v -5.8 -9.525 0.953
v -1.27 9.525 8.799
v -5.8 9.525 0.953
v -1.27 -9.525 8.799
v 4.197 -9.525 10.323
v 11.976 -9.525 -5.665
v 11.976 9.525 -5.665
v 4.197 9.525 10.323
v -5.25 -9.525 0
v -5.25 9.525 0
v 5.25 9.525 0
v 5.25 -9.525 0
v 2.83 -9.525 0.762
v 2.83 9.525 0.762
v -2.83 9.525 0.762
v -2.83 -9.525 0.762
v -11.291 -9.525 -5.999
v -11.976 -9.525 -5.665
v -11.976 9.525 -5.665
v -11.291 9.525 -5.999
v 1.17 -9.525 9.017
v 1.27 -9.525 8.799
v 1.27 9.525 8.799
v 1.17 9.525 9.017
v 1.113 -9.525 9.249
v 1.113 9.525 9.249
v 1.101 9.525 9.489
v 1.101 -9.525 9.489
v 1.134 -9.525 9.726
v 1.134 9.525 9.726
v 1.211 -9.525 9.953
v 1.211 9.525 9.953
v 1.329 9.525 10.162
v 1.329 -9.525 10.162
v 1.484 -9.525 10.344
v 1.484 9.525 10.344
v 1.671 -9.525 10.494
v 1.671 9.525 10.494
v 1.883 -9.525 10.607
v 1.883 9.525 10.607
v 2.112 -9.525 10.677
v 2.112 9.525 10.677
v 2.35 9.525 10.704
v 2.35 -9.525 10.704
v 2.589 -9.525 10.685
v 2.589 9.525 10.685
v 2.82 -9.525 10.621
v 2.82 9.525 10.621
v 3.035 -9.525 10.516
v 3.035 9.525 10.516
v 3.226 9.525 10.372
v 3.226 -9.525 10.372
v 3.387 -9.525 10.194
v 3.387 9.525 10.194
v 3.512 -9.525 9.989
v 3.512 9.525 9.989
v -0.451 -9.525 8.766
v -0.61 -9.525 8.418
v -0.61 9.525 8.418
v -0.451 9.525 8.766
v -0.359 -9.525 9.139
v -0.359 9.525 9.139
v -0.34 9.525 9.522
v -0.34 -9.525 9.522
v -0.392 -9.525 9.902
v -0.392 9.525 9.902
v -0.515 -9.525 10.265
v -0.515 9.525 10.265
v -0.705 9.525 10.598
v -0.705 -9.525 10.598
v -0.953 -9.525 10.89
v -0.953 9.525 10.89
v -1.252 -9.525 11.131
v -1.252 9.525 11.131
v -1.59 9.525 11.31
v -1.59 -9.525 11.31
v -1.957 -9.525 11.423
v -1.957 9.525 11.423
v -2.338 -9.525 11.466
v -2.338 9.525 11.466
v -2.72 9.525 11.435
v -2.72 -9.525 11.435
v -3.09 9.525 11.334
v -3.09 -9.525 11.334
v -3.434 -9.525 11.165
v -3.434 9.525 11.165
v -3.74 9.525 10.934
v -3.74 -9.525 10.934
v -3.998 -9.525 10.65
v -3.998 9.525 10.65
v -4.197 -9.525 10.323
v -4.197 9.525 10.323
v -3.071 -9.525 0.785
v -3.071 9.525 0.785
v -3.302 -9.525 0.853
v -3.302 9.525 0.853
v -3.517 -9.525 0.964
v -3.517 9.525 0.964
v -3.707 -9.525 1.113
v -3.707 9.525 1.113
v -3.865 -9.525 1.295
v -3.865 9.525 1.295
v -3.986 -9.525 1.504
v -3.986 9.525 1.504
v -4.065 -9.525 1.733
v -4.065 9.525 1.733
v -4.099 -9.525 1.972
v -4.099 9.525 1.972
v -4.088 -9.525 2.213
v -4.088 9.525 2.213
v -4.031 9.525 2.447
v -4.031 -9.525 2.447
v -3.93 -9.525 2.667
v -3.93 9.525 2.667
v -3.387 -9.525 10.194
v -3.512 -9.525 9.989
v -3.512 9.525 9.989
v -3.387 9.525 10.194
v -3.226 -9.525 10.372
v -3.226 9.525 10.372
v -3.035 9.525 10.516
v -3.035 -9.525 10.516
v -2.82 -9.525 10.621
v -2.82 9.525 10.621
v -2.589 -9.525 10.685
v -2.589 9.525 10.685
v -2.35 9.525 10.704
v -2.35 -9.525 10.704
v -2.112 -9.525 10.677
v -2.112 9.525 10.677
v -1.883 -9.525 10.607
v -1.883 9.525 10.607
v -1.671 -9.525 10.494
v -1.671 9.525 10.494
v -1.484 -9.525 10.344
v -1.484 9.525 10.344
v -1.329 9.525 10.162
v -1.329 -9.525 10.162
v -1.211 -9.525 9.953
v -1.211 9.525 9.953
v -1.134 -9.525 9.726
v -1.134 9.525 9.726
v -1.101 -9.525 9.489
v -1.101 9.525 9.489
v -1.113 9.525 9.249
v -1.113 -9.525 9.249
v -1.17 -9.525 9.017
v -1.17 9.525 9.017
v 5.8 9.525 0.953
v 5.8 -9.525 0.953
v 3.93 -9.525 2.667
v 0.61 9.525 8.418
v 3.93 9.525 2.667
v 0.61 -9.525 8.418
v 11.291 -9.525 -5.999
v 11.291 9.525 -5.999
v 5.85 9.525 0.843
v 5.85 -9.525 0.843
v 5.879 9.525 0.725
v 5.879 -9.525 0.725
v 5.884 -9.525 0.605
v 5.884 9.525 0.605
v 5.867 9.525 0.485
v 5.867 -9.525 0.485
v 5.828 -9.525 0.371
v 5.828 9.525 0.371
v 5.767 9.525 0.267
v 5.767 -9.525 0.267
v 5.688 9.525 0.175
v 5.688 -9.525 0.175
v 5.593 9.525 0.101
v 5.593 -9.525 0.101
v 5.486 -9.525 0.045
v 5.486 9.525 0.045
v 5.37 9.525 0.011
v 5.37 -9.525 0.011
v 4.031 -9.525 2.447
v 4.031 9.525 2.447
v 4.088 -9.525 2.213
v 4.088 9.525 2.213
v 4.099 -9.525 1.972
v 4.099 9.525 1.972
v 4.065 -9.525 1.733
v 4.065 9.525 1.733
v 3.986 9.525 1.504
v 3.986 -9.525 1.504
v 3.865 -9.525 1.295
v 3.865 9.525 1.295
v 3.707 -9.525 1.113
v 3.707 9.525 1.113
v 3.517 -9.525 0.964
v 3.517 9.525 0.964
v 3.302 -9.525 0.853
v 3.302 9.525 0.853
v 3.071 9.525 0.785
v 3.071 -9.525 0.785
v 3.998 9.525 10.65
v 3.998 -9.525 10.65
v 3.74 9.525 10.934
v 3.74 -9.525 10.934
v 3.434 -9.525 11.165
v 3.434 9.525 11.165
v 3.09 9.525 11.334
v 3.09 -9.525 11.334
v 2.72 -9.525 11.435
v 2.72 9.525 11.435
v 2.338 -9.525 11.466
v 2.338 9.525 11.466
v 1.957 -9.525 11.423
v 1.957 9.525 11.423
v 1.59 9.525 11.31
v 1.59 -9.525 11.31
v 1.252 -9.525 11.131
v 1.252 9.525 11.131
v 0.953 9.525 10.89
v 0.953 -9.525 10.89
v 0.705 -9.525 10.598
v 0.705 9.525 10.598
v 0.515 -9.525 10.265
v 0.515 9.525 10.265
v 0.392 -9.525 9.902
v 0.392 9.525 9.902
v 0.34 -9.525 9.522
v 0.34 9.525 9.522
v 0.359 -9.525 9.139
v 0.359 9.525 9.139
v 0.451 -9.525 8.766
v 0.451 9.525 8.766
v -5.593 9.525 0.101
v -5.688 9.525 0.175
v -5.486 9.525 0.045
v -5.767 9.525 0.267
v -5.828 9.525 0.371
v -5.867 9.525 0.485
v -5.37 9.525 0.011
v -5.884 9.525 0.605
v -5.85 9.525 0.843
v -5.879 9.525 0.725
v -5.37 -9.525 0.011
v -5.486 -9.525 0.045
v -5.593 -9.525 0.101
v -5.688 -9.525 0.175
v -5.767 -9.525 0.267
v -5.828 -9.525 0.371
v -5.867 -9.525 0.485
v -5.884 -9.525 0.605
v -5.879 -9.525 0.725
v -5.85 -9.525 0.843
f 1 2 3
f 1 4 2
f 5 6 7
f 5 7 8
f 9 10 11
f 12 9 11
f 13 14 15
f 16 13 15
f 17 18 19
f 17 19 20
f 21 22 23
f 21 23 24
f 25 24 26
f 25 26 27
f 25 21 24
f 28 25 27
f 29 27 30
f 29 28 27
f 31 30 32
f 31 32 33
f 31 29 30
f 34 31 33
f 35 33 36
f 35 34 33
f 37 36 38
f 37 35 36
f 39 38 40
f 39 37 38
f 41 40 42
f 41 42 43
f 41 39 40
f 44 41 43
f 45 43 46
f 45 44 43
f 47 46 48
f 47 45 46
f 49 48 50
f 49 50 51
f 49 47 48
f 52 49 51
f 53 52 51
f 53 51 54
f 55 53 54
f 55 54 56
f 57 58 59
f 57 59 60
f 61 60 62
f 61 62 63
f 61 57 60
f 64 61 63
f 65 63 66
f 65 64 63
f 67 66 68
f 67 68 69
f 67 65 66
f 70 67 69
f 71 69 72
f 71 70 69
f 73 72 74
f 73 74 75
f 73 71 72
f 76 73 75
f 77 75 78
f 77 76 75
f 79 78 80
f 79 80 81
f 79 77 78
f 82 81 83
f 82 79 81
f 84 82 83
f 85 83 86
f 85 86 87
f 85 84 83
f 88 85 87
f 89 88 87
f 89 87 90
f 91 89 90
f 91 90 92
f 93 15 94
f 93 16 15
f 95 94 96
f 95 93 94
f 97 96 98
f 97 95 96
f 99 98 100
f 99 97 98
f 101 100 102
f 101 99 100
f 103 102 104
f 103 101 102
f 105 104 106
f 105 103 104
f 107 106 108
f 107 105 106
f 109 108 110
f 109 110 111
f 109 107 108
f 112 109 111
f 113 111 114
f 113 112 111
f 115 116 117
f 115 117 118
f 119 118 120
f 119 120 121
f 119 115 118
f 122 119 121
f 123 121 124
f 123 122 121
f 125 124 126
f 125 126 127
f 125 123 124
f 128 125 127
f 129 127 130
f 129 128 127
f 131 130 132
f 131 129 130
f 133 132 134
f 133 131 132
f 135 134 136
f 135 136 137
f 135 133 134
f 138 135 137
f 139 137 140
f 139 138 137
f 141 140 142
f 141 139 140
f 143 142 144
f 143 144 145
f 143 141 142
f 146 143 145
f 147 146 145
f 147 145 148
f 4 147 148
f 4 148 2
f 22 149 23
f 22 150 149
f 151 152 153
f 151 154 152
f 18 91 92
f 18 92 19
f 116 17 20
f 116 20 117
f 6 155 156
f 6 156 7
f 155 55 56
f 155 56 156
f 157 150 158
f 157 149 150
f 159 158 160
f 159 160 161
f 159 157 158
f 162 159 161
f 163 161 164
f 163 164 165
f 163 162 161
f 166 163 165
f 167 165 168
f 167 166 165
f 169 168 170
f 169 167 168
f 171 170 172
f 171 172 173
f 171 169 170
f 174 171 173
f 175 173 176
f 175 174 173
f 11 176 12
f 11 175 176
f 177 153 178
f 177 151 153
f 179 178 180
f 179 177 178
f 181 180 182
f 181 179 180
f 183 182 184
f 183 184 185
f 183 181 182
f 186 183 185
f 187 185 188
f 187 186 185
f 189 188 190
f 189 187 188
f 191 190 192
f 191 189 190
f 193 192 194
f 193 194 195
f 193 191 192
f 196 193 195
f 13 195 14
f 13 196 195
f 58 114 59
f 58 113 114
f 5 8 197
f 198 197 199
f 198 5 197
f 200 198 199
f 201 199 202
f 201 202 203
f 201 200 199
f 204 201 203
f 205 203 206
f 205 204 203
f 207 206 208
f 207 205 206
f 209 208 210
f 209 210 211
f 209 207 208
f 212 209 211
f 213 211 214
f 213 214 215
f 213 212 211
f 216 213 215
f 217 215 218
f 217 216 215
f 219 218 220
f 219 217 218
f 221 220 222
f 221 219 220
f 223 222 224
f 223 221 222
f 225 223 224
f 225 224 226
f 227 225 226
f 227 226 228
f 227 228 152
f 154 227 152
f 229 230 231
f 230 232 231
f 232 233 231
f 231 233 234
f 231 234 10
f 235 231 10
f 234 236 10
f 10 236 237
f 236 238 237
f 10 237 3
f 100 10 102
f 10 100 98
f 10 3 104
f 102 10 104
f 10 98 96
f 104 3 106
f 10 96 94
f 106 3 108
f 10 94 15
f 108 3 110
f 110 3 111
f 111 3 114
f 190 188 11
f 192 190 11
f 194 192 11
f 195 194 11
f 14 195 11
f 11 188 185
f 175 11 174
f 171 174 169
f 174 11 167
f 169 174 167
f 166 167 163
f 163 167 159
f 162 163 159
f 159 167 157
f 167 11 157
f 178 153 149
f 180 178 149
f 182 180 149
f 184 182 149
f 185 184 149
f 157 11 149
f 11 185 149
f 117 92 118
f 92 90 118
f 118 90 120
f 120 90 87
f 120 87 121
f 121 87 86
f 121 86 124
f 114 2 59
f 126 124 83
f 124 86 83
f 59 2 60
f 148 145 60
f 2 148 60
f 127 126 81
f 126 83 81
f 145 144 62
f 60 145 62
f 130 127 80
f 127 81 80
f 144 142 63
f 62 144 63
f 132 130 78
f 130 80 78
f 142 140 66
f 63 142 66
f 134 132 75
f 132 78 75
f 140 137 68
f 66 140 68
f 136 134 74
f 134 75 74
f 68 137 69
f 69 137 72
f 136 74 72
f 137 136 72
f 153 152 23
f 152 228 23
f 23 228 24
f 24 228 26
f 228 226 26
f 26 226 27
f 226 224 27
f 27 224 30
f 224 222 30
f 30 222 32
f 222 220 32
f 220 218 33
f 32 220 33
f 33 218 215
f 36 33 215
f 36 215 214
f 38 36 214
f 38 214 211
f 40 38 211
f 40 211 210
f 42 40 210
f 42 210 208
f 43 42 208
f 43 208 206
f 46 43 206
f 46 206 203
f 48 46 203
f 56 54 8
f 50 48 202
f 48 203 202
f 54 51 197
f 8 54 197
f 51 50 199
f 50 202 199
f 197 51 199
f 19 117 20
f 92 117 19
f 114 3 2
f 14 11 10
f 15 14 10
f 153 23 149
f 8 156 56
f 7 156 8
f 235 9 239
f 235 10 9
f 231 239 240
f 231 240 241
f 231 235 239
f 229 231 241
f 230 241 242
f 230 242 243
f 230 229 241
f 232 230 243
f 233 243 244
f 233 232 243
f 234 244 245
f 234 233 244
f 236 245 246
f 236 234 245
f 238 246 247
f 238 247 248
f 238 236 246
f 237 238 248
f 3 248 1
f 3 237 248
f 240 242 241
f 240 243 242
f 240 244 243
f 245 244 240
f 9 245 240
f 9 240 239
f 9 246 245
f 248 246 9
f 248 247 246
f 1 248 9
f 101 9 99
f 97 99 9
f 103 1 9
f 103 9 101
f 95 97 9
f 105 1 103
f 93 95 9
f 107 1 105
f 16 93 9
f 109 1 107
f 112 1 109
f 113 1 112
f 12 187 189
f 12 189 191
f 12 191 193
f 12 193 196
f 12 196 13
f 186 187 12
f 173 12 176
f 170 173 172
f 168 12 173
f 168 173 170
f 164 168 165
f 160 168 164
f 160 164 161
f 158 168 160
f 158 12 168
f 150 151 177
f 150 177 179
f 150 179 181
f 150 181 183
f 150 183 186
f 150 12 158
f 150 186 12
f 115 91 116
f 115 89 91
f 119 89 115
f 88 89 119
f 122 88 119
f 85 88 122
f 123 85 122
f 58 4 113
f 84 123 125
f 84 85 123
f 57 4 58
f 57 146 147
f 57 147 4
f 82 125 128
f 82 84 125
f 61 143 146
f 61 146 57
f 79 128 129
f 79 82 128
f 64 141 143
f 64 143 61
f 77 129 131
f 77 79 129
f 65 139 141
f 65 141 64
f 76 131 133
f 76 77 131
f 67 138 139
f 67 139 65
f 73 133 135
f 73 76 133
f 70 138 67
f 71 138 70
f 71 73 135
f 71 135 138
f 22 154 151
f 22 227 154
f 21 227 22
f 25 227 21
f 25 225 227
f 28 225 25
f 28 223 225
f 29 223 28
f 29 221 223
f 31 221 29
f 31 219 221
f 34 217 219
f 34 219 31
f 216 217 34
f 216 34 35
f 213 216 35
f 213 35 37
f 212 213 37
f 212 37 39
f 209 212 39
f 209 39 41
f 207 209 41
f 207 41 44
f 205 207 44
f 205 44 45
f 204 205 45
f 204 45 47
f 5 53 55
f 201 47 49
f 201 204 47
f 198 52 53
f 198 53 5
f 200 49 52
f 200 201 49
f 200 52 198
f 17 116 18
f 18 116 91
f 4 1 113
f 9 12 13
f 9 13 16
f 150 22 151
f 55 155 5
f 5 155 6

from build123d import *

# Parameters (mm, degrees)
F1_DEPTH = 9.525
F2_R     = 0.635
F3_R     = 1.27


with BuildPart() as f1:
    # F0 (on Front) → F1 (new body, symmetric)
    with BuildSketch(Plane.XZ):
        with BuildLine():
            Line((0, 0.762), (0, 0))
            Line((0, 0), (6.35, 0))
            Line((6.35, 0), (1.27, 8.798818))
            ThreePointArc((1.27, 8.798818), (1.774167, 10.55545), (3.51186, 9.989443))
            Line((3.51186, 9.989443), (11.29061, -5.99866))
            Line((11.29061, -5.99866), (11.975814, -5.665285))
            Line((11.975814, -5.665285), (4.197064, 10.322818))
            ThreePointArc((4.197064, 10.322818), (1.416755, 11.22843), (0.610089, 8.417818))
            Line((0.610089, 8.417818), (5.030177, 0.762))
            Line((5.030177, 0.762), (0, 0.762))
        make_face()
        with BuildLine():
            Line((-6.35, 0), (0, 0))
            Line((0, 0), (0, 0.762))
            Line((0, 0.762), (-5.030177, 0.762))
            Line((-5.030177, 0.762), (-0.610089, 8.417818))
            ThreePointArc((-0.610089, 8.417818), (-1.416755, 11.22843), (-4.197064, 10.322818))
            Line((-4.197064, 10.322818), (-11.975814, -5.665285))
            Line((-11.975814, -5.665285), (-11.29061, -5.99866))
            Line((-11.29061, -5.99866), (-3.51186, 9.989443))
            ThreePointArc((-3.51186, 9.989443), (-1.774167, 10.55545), (-1.27, 8.798818))
            Line((-1.27, 8.798818), (-6.35, 0))
        make_face()
    extrude(amount=F1_DEPTH, both=True)

    # F2
    f2_edges = [f1.edges().sort_by_distance(p)[0] for p in [
        (6.35, 0, 0),
        (-6.35, 0, 0),
    ]]
    fillet(f2_edges, radius=F2_R)

    # F3
    f3_edges = [f1.edges().sort_by_distance(p)[0] for p in [
        (5.030177, 0, 0.762),
        (-5.030177, 0, 0.762),
    ]]
    fillet(f3_edges, radius=F3_R)


solid = f1.part
